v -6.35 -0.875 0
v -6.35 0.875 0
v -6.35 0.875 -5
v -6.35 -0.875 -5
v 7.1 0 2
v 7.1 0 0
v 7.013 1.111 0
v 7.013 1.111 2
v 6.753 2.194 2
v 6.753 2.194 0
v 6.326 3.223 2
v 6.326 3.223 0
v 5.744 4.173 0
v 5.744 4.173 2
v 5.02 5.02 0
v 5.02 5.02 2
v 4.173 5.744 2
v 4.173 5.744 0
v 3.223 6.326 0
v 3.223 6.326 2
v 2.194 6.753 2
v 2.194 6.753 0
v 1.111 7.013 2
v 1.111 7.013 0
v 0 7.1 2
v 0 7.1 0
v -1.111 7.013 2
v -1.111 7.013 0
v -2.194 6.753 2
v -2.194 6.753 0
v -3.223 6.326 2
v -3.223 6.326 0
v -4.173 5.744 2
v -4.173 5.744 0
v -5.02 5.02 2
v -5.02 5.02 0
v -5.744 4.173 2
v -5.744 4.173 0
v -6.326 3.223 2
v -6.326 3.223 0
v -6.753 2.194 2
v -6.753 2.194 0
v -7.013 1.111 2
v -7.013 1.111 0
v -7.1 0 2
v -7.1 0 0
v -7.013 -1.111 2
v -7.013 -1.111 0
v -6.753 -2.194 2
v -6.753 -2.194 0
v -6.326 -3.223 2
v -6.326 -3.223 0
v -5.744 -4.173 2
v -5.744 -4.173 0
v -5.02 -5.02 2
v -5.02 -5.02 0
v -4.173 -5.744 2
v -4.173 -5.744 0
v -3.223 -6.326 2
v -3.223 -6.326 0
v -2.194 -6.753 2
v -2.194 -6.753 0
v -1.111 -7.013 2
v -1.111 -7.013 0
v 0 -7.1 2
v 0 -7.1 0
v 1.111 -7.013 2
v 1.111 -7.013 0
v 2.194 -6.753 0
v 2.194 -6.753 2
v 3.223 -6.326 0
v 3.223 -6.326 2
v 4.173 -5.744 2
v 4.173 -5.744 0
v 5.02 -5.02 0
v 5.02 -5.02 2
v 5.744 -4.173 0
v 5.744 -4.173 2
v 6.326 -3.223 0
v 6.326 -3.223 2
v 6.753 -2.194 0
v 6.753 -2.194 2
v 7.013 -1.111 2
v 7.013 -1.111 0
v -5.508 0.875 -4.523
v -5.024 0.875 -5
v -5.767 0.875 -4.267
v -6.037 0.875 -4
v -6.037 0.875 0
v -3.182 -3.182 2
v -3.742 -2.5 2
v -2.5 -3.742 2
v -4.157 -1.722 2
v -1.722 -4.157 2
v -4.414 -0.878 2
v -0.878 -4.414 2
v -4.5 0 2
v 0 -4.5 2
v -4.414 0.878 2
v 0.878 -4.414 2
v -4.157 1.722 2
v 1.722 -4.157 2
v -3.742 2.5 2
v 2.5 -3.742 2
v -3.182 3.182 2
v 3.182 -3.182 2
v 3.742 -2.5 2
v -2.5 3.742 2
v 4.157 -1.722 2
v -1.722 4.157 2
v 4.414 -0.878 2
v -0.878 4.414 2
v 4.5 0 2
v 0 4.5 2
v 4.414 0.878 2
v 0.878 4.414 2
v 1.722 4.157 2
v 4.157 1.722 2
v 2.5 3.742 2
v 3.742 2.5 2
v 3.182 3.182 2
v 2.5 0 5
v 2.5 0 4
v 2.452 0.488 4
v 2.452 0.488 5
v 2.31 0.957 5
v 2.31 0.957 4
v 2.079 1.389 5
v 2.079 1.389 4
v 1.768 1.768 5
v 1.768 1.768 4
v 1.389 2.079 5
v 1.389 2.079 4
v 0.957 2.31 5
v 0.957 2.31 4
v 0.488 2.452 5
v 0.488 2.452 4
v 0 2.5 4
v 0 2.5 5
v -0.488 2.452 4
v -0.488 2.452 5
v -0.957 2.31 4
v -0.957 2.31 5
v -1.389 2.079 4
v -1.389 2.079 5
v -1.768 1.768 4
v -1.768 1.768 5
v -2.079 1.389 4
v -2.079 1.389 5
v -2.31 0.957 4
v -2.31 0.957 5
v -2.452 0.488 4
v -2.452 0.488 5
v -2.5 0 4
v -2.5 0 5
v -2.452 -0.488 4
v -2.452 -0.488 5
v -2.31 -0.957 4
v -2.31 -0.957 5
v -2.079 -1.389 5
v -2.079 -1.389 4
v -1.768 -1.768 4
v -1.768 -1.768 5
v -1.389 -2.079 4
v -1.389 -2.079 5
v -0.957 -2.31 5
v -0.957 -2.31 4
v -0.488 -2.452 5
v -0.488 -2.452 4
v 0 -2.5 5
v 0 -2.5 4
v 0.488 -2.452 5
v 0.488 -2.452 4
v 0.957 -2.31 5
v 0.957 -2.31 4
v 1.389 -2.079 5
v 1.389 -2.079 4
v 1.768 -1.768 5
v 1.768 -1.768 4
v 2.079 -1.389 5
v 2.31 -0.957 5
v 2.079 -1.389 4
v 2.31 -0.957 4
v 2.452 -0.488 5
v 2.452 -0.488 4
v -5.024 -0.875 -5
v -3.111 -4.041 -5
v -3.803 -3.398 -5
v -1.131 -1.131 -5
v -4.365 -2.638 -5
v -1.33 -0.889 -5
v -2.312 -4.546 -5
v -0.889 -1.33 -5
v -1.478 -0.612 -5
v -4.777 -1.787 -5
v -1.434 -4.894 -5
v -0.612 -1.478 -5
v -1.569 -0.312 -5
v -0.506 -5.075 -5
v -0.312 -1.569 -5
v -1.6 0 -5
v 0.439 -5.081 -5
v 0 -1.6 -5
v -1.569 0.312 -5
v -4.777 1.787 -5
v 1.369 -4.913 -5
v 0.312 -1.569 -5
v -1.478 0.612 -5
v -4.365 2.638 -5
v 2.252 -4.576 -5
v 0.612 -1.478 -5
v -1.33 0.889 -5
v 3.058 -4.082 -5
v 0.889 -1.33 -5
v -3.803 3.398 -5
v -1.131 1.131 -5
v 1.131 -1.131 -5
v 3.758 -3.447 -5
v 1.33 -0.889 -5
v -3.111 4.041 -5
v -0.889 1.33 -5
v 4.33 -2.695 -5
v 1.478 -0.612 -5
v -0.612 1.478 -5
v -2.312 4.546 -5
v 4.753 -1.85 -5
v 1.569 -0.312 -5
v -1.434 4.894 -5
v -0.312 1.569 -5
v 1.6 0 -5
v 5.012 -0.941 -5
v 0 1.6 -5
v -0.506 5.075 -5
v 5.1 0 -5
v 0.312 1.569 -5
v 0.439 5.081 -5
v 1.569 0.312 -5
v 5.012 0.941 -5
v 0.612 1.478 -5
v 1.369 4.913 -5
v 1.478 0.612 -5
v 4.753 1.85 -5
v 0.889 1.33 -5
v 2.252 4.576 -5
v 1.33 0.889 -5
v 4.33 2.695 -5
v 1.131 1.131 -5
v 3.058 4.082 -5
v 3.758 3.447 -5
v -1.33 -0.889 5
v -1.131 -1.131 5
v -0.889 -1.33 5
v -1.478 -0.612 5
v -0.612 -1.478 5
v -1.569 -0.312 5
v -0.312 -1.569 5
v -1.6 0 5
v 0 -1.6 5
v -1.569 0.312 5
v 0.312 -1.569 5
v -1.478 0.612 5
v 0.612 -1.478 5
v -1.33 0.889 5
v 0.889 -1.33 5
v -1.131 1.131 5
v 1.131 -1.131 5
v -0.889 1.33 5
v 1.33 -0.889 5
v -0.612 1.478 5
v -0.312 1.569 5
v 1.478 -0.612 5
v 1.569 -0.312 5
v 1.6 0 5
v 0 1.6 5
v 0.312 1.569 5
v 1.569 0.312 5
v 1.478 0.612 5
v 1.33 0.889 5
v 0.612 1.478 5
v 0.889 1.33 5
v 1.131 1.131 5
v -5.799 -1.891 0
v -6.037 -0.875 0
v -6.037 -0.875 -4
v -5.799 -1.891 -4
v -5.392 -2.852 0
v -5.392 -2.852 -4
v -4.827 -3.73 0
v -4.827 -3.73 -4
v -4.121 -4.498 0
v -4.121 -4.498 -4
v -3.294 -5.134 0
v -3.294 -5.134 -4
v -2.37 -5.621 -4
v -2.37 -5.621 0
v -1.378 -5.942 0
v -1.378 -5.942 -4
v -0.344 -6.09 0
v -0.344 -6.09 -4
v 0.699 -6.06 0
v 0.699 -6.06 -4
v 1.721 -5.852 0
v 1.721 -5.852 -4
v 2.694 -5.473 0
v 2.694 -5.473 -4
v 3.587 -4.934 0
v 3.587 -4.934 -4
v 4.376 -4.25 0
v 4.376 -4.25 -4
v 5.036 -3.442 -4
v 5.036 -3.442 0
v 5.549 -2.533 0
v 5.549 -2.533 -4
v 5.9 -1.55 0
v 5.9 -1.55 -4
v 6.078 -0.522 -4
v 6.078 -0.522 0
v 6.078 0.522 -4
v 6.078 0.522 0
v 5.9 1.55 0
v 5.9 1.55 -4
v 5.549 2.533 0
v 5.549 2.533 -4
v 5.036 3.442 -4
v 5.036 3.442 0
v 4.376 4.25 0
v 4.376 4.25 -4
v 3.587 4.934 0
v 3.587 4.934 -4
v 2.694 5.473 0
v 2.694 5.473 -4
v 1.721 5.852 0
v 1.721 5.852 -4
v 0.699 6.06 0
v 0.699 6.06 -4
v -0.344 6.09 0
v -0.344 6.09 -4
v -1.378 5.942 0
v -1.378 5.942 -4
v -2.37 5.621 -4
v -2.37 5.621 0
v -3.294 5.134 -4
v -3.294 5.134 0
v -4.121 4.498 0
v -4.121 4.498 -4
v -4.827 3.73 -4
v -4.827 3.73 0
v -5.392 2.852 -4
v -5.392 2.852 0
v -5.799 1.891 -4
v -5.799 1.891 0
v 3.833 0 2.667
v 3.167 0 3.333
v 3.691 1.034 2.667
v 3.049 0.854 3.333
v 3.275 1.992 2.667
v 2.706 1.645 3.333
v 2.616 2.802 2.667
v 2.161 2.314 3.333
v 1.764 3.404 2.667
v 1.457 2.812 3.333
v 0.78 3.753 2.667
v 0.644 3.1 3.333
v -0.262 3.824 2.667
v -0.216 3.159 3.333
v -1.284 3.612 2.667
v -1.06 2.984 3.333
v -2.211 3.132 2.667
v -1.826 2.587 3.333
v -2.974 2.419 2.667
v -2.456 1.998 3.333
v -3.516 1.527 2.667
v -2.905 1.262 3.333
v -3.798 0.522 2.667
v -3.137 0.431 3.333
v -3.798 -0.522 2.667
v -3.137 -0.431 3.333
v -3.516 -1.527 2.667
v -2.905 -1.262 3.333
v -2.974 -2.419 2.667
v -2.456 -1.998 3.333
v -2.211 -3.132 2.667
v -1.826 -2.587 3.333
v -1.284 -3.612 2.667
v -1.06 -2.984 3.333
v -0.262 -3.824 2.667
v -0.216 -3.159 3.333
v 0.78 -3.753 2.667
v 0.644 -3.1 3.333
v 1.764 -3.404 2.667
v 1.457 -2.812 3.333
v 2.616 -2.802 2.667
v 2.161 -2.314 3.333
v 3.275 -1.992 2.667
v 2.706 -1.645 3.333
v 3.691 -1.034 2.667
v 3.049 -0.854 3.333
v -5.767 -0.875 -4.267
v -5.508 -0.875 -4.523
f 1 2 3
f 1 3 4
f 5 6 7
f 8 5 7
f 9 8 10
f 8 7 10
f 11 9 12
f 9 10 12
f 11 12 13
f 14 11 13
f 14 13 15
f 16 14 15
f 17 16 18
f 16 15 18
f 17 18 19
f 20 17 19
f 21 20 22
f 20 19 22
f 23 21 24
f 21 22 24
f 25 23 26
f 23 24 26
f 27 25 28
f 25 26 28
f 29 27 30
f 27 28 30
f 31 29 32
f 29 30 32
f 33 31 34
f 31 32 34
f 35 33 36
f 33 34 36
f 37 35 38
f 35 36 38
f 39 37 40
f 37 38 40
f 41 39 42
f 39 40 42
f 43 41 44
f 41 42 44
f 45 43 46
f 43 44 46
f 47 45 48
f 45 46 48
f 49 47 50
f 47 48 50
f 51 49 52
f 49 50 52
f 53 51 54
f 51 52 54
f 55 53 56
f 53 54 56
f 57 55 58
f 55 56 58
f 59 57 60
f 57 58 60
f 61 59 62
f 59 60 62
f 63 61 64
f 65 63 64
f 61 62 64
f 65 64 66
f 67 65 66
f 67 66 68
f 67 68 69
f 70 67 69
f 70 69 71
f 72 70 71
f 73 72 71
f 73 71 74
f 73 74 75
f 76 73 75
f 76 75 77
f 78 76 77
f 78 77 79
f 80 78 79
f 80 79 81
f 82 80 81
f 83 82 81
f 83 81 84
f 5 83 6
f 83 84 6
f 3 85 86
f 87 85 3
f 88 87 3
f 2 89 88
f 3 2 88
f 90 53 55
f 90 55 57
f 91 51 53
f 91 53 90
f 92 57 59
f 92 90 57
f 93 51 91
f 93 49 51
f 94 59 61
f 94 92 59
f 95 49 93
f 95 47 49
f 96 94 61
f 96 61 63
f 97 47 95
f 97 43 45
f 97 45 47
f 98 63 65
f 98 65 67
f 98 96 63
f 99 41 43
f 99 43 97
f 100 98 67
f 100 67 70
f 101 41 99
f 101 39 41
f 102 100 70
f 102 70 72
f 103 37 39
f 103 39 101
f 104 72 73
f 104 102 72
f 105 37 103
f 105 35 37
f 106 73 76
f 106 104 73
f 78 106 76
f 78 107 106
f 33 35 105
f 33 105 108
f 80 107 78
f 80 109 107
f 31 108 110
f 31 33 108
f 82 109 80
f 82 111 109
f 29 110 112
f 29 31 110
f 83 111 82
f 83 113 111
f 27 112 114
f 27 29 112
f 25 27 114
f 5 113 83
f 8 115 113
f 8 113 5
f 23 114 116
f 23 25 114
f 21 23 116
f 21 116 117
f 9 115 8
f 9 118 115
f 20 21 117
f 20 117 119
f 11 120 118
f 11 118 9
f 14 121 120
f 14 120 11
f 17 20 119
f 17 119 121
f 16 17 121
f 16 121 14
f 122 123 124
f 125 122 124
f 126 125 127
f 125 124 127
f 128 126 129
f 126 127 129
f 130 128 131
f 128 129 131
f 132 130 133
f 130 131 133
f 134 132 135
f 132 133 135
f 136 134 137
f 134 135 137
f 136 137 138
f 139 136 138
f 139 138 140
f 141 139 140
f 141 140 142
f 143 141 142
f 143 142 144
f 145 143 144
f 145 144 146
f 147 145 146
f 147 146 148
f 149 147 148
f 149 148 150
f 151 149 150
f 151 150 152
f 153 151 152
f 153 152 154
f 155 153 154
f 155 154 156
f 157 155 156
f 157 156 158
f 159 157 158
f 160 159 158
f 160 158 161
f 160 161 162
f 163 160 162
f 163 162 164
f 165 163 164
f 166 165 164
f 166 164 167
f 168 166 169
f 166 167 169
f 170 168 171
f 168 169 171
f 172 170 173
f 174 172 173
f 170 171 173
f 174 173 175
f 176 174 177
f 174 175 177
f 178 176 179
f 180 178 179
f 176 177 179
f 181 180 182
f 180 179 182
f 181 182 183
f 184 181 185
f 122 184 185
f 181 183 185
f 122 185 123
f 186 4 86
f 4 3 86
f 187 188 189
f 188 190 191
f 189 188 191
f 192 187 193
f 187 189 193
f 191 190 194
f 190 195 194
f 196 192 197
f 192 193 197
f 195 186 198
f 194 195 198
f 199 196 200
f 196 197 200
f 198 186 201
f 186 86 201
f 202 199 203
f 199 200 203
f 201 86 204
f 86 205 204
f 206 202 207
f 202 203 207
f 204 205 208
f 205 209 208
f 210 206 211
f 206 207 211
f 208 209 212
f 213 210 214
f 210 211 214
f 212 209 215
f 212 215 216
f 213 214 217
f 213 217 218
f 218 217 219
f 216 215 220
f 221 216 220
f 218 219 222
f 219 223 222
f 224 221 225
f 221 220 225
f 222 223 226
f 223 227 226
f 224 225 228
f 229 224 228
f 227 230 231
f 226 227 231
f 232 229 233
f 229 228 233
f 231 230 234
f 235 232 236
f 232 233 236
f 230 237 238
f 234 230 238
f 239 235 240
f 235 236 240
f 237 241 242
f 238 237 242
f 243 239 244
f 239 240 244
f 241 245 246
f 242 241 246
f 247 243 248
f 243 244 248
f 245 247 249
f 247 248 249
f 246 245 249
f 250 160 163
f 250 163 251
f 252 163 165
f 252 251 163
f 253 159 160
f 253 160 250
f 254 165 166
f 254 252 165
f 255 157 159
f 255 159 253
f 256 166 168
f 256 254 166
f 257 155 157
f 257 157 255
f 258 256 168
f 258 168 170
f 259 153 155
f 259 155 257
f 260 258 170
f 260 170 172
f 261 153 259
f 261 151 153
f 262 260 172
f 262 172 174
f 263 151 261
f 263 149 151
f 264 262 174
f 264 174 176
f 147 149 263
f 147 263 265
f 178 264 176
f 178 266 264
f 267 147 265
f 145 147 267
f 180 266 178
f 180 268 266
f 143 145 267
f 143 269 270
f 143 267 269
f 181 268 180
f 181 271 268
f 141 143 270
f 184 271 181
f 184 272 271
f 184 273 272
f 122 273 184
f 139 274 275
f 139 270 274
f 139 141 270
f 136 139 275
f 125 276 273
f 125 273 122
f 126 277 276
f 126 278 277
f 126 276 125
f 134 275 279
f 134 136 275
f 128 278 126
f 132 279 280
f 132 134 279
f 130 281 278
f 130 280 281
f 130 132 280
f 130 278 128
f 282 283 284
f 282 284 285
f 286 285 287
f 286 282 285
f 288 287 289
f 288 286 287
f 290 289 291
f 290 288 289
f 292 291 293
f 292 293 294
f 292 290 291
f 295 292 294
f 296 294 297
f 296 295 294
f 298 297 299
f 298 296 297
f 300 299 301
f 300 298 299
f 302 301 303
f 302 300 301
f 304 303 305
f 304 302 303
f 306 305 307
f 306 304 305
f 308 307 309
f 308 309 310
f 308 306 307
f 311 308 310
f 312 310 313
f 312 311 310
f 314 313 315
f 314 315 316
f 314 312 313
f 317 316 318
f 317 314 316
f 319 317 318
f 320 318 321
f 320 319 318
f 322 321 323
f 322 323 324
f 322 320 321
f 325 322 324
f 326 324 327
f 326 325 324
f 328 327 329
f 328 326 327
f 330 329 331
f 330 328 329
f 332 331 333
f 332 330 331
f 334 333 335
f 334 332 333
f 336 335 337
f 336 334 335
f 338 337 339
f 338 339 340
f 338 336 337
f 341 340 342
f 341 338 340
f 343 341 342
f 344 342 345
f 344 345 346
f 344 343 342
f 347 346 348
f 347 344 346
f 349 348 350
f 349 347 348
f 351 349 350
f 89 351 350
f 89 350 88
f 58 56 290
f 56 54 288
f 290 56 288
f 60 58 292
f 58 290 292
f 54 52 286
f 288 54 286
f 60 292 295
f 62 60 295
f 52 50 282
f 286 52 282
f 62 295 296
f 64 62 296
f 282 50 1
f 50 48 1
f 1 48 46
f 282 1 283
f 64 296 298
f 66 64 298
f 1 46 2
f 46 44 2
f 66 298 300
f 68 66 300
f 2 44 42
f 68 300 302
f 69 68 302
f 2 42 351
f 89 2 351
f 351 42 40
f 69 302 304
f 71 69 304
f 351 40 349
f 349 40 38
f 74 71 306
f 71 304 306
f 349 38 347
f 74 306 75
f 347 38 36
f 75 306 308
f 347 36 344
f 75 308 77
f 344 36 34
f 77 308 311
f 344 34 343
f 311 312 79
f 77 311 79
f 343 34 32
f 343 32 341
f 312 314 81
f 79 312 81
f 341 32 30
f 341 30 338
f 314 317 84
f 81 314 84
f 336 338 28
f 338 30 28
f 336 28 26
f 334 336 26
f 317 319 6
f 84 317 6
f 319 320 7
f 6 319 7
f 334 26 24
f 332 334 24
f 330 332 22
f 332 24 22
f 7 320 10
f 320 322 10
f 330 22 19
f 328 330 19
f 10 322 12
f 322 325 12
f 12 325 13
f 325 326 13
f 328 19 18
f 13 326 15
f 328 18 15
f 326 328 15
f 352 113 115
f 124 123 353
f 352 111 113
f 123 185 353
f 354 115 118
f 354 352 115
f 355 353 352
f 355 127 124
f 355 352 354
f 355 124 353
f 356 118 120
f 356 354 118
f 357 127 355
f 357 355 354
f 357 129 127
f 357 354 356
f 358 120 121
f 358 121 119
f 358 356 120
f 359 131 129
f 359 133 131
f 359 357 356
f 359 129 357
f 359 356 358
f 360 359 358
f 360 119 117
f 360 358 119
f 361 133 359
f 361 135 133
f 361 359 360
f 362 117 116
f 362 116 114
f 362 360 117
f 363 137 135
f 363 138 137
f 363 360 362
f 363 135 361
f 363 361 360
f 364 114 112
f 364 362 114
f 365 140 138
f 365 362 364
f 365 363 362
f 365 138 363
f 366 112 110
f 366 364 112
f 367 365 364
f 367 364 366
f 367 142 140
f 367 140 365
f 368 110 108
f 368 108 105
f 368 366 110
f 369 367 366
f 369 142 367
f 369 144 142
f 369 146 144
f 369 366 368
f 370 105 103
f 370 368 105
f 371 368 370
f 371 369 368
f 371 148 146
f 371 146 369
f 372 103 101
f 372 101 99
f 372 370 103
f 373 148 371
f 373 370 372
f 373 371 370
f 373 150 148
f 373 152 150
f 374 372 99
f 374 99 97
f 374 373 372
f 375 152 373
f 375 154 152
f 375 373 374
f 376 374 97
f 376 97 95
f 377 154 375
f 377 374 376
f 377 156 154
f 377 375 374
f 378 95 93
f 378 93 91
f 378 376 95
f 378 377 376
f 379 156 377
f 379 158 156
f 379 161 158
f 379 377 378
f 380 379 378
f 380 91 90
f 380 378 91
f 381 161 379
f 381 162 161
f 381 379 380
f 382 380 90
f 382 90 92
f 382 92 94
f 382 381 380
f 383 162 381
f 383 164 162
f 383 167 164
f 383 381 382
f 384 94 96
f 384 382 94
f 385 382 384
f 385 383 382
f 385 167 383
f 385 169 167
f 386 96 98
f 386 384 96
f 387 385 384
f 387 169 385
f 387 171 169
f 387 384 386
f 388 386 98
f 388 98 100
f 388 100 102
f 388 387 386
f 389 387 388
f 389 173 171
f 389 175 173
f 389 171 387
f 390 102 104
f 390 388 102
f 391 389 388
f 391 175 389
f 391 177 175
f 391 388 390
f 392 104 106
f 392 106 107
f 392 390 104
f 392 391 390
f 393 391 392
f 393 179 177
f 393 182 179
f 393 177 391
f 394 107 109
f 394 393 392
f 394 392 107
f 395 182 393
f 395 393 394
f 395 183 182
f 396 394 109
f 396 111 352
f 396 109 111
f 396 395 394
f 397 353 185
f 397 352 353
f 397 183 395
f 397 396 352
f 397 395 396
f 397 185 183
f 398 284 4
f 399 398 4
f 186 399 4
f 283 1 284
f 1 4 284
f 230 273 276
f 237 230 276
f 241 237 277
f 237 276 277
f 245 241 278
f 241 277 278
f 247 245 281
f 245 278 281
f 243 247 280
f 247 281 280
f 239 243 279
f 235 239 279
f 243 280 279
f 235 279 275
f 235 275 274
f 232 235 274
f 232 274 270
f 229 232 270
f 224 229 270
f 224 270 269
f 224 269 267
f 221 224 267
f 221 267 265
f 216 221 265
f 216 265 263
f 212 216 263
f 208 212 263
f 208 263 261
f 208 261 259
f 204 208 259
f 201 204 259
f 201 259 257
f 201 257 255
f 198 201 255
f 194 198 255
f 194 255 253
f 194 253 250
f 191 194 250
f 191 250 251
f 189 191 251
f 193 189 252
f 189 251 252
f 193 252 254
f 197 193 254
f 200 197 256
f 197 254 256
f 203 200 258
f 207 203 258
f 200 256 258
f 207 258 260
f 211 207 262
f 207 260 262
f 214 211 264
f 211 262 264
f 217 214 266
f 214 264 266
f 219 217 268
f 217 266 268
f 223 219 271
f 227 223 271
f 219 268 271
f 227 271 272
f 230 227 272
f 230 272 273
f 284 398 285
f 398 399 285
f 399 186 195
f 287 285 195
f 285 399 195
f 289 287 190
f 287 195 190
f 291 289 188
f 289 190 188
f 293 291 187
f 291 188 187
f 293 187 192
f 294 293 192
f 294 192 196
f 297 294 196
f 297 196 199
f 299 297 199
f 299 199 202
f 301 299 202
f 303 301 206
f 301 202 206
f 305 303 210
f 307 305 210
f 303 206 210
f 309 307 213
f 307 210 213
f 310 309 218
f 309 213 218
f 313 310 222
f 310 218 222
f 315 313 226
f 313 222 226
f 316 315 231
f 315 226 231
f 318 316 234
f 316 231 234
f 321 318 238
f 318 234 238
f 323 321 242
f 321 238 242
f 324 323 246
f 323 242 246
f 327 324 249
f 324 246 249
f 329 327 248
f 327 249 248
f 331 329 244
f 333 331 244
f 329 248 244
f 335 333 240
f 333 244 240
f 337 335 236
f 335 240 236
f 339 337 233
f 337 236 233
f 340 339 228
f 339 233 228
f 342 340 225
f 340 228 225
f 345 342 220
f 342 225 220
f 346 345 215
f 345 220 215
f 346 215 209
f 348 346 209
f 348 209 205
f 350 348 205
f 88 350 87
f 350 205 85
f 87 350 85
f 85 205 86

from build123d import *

# Parameters (mm, degrees)
EXTRUDE_1_DEPTH     = 5
SKETCH_2_R          = 7.1
EXTRUDE_2_DEPTH     = 2
SKETCH_3_R          = 2.5
EXTRUDE_3_DEPTH     = 7
CHAMFER_1_SIZE      = 2
SKETCH_4_R          = 1.6
CUT_EXTRUDE_1_DEPTH = 30
CHAMFER_2_SIZE      = 1
MOVE_FACE_1_BY      = 4


with BuildPart() as part:
    # ｽｹｯﾁ1 → ﾎﾞｽ - 押し出し1 (new body)
    with BuildSketch(Plane.XY):
        with BuildLine():
            Line((-6.35, -0.875), (-6.036917674, -0.875))
            ThreePointArc((-6.036917674, -0.875), (6.1, 0), (-6.036917674, 0.875))
            Line((-6.036917674, 0.875), (-6.35, 0.875))
            Line((-6.35, 0.875), (-6.35, -0.875))
        make_face()
    extrude(amount=-EXTRUDE_1_DEPTH)

    # ｽｹｯﾁ2 → ﾎﾞｽ - 押し出し2 (add)
    with BuildSketch(Plane.XY):
        Circle(SKETCH_2_R)
    extrude(amount=EXTRUDE_2_DEPTH)

    # ｽｹｯﾁ3 → ﾎﾞｽ - 押し出し3 (add)
    with BuildSketch(Plane.XY.offset(2)):
        Circle(SKETCH_3_R)
    extrude(amount=EXTRUDE_3_DEPTH)

    # 面取り1
    chamfer_1_edges = [part.edges().sort_by_distance(p)[0] for p in [
        (-2.5, 0, 2),
    ]]
    chamfer(chamfer_1_edges, length=CHAMFER_1_SIZE)

    # ｽｹｯﾁ4 → ｶｯﾄ - 押し出し1 (cut)
    with BuildSketch(Plane.XY.offset(9)):
        Circle(SKETCH_4_R)
    extrude(amount=-CUT_EXTRUDE_1_DEPTH, mode=Mode.SUBTRACT)

    # 面取り2
    chamfer_2_edges = [part.edges().sort_by_distance(p)[0] for p in [
        (6.1, 0, -5),
    ]]
    chamfer(chamfer_2_edges, length=CHAMFER_2_SIZE)

    # Move Face 1: a face moved inward by 4.0
    extrude(part.faces().sort_by_distance((0, -2, 9))[0], amount=MOVE_FACE_1_BY, dir=(0, 0, -1), mode=Mode.SUBTRACT)


solid = part.part
